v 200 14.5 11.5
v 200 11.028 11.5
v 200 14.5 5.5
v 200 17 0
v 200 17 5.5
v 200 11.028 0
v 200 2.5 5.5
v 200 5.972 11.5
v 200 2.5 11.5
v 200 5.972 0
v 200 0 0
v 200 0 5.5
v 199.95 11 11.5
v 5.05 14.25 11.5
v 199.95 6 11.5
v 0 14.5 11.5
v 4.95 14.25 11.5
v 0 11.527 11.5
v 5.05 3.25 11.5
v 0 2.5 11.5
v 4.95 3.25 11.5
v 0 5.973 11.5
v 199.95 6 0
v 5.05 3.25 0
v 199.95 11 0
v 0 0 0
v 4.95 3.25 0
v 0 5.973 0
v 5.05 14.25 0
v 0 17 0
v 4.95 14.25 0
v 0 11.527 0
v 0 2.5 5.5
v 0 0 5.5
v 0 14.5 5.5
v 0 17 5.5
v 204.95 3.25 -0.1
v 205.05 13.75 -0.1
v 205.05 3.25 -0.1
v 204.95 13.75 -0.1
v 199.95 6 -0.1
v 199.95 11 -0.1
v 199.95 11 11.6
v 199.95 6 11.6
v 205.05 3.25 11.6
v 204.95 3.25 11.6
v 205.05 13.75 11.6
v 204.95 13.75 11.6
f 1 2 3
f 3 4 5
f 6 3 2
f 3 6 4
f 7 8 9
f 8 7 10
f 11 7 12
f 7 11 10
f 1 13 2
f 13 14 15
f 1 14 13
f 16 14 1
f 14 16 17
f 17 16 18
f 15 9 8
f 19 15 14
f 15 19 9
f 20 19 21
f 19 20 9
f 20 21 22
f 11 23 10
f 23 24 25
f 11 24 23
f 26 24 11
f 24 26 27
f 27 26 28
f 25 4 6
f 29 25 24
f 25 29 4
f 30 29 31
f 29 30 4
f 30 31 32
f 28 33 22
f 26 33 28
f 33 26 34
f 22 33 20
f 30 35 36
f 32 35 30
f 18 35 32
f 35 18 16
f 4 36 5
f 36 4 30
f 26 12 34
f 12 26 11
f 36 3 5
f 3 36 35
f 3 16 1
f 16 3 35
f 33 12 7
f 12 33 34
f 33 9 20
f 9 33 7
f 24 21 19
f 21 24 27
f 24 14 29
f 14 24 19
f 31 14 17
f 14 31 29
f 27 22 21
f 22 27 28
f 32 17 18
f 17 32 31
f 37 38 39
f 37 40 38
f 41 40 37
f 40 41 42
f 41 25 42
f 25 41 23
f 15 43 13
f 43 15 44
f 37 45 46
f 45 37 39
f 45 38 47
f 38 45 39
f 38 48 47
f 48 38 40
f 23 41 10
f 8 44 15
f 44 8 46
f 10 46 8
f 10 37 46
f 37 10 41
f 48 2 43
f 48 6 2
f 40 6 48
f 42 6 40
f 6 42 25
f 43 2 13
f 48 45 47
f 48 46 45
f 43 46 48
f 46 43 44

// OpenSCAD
// file: ../libraries/t-track.scad
module bar(length, height, base_width, top_width, top_extend){
  difference(){
    cube([length,base_width,height], false);
    translate([-1,base_width/2+(top_width/2),(height-top_extend)]){
      cube([length+2,base_width,height], false);
    }
    translate([-1,-(base_width/2)-(top_width/2),(height-top_extend)]){
      cube([length+2,base_width,height], false);
    }
  }
}

module end(opening, internal, height, width){
  translate([0,(width/2)+(opening/2),height/2])
    rotate([90,0,90]){
    hull(){
      cube([opening, height+0.2, 0.1],center=true);
      translate([0,0,5]) {
        cube([internal, height+0.2, 0.1],center=true);
      }
    }
  }
}

module rail(length, height, base_width, top_width, top_extend) {
  insert_internal = top_width - 1;
  insert_opening = (top_width - 1)/2;
  translate([length,0,0]){
    end(insert_opening-0.5,insert_internal-0.5,height, top_width);
  }

  difference() {
    bar(length, height, base_width, top_width, top_extend);
    end(insert_opening,insert_internal,height, top_width);
  }
}
// main file
use <../libraries/t-track.scad>;

$fn=50;

rail(200, 11.5, 17, 12, 6);
